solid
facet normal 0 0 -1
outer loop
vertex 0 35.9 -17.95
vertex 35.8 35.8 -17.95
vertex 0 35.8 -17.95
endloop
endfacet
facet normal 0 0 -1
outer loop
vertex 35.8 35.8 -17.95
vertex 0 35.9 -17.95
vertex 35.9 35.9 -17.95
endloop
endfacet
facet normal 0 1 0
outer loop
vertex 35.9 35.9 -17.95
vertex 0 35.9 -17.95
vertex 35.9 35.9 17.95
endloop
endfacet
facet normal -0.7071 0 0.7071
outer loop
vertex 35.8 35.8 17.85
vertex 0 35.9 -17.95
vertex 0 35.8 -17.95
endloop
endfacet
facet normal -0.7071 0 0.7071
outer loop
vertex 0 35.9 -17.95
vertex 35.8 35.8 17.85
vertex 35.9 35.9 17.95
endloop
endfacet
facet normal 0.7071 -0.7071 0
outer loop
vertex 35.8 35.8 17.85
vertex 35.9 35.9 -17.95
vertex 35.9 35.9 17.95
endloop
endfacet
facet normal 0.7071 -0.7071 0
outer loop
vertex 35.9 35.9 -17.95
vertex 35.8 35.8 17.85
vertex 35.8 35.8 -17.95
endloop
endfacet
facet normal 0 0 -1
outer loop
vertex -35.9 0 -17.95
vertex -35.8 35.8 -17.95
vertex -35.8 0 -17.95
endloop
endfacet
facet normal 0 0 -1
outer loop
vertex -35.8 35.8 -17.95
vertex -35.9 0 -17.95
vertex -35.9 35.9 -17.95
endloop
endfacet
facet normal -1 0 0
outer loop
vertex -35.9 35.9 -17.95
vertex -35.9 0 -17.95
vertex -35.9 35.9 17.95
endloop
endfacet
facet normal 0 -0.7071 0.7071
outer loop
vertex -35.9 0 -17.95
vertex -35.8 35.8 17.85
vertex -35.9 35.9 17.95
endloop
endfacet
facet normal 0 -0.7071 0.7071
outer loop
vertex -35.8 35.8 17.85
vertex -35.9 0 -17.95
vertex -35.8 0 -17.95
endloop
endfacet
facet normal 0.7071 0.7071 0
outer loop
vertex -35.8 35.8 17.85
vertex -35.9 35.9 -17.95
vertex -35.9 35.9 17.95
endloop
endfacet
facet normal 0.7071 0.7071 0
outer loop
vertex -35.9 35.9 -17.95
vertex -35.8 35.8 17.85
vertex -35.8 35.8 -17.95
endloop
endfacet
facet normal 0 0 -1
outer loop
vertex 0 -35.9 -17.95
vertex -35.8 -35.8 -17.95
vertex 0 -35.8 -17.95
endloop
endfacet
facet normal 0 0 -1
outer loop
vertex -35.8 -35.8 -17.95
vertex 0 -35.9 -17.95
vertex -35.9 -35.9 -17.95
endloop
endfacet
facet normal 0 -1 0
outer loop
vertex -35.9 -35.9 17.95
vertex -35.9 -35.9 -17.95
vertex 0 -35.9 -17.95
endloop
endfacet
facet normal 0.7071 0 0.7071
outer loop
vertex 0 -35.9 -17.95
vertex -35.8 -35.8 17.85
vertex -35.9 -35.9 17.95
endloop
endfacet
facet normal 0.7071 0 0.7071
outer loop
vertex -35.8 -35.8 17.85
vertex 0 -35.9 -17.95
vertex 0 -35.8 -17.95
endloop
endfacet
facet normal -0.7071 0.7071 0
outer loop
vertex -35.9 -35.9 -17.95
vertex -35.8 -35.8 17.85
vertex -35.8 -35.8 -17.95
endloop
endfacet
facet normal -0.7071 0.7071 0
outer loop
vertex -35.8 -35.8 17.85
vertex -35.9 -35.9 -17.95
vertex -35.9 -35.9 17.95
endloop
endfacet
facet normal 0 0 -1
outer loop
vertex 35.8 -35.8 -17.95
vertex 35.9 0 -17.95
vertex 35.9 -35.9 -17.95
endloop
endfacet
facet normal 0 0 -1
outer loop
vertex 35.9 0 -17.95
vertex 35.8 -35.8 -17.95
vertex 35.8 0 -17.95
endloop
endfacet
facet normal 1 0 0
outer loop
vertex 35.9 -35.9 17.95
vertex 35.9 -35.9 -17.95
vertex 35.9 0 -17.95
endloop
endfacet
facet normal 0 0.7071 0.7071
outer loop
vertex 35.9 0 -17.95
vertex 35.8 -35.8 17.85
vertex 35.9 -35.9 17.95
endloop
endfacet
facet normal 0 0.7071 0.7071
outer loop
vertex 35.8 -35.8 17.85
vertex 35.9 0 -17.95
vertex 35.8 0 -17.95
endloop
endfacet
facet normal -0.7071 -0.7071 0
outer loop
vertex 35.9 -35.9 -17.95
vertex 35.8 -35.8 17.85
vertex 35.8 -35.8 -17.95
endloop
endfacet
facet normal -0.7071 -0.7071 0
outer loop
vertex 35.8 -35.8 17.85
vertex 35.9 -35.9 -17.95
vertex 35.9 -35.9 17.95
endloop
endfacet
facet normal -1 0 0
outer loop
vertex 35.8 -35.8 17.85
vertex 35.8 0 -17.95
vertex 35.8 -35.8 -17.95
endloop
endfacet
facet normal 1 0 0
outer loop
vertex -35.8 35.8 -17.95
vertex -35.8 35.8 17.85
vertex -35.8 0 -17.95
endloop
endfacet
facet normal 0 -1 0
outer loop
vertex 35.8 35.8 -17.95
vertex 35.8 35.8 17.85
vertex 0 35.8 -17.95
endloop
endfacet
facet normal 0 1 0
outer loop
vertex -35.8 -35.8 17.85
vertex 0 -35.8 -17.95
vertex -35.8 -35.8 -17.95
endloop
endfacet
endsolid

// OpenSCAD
// file: def.scad
total_size = 72;
block_size_2 = total_size / 2 - 0.1;
block_size_4 = total_size / 4;
block_size_6 = total_size / 6;

inf = 1000;

round_radius = 1;
sticker_margin = 2.5;
sticker_round_radius = 0.75;

module _block(size) {
    minkowski() {
        cube([size - round_radius * 2, size - round_radius * 2, size - round_radius * 2], center = true);
        sphere(r = round_radius, $fn = 24);
    }
}

module _selector_0(size) {
    cube([size - 0.2, size - 0.2, size - 0.2], center = true);
}

module _sticker(size) {
    minkowski() {
        cube([size - sticker_margin * 2, size - sticker_margin * 2, 0.1], center = true);
        cylinder(r = sticker_round_radius, h = 0.1, $fn = 24);
    }
}

module _selector_corner_cw(size) {
    difference() {
        cube([size, size, size], center = true);
        rotate([0, -45, 0])
            translate([-inf, -inf, 0])
                cube([inf * 2, inf * 2, inf]);
        rotate([90, 0, 45])
            translate([-inf, -inf, 0])
                cube([inf * 2, inf * 2, inf]);
    }
}

module _selector_corner_ccw(size) {
    difference() {
        cube([size, size, size], center = true);
        rotate([45, 0, 0])
            translate([-inf, -inf, 0])
                cube([inf * 2, inf * 2, inf]);
        rotate([0, -90, -45])
            translate([-inf, -inf, 0])
                cube([inf * 2, inf * 2, inf]);
    }
}

module _selector_edge_cw(size) {
    difference() {
        cube([size, size, size], center = true);
        rotate([90, 0, 45])
            translate([-inf, -inf, 0])
                cube([inf * 2, inf * 2, inf]);
    }
}

module _selector_edge_ccw(size) {
    difference() {
        cube([size, size, size], center = true);
        rotate([0, -90, -45])
            translate([-inf, -inf, 0])
                cube([inf * 2, inf * 2, inf]);
    }
}
// main file
include <def.scad>

difference() {
    for (deg = [0 : 90 : 270])
        rotate([0, 0, deg])
            translate([block_size_2 * 0.5, block_size_2 * 0.5, 0])
                _selector_corner_cw(block_size_2);
    _selector_0(block_size_2 * 2);
}
